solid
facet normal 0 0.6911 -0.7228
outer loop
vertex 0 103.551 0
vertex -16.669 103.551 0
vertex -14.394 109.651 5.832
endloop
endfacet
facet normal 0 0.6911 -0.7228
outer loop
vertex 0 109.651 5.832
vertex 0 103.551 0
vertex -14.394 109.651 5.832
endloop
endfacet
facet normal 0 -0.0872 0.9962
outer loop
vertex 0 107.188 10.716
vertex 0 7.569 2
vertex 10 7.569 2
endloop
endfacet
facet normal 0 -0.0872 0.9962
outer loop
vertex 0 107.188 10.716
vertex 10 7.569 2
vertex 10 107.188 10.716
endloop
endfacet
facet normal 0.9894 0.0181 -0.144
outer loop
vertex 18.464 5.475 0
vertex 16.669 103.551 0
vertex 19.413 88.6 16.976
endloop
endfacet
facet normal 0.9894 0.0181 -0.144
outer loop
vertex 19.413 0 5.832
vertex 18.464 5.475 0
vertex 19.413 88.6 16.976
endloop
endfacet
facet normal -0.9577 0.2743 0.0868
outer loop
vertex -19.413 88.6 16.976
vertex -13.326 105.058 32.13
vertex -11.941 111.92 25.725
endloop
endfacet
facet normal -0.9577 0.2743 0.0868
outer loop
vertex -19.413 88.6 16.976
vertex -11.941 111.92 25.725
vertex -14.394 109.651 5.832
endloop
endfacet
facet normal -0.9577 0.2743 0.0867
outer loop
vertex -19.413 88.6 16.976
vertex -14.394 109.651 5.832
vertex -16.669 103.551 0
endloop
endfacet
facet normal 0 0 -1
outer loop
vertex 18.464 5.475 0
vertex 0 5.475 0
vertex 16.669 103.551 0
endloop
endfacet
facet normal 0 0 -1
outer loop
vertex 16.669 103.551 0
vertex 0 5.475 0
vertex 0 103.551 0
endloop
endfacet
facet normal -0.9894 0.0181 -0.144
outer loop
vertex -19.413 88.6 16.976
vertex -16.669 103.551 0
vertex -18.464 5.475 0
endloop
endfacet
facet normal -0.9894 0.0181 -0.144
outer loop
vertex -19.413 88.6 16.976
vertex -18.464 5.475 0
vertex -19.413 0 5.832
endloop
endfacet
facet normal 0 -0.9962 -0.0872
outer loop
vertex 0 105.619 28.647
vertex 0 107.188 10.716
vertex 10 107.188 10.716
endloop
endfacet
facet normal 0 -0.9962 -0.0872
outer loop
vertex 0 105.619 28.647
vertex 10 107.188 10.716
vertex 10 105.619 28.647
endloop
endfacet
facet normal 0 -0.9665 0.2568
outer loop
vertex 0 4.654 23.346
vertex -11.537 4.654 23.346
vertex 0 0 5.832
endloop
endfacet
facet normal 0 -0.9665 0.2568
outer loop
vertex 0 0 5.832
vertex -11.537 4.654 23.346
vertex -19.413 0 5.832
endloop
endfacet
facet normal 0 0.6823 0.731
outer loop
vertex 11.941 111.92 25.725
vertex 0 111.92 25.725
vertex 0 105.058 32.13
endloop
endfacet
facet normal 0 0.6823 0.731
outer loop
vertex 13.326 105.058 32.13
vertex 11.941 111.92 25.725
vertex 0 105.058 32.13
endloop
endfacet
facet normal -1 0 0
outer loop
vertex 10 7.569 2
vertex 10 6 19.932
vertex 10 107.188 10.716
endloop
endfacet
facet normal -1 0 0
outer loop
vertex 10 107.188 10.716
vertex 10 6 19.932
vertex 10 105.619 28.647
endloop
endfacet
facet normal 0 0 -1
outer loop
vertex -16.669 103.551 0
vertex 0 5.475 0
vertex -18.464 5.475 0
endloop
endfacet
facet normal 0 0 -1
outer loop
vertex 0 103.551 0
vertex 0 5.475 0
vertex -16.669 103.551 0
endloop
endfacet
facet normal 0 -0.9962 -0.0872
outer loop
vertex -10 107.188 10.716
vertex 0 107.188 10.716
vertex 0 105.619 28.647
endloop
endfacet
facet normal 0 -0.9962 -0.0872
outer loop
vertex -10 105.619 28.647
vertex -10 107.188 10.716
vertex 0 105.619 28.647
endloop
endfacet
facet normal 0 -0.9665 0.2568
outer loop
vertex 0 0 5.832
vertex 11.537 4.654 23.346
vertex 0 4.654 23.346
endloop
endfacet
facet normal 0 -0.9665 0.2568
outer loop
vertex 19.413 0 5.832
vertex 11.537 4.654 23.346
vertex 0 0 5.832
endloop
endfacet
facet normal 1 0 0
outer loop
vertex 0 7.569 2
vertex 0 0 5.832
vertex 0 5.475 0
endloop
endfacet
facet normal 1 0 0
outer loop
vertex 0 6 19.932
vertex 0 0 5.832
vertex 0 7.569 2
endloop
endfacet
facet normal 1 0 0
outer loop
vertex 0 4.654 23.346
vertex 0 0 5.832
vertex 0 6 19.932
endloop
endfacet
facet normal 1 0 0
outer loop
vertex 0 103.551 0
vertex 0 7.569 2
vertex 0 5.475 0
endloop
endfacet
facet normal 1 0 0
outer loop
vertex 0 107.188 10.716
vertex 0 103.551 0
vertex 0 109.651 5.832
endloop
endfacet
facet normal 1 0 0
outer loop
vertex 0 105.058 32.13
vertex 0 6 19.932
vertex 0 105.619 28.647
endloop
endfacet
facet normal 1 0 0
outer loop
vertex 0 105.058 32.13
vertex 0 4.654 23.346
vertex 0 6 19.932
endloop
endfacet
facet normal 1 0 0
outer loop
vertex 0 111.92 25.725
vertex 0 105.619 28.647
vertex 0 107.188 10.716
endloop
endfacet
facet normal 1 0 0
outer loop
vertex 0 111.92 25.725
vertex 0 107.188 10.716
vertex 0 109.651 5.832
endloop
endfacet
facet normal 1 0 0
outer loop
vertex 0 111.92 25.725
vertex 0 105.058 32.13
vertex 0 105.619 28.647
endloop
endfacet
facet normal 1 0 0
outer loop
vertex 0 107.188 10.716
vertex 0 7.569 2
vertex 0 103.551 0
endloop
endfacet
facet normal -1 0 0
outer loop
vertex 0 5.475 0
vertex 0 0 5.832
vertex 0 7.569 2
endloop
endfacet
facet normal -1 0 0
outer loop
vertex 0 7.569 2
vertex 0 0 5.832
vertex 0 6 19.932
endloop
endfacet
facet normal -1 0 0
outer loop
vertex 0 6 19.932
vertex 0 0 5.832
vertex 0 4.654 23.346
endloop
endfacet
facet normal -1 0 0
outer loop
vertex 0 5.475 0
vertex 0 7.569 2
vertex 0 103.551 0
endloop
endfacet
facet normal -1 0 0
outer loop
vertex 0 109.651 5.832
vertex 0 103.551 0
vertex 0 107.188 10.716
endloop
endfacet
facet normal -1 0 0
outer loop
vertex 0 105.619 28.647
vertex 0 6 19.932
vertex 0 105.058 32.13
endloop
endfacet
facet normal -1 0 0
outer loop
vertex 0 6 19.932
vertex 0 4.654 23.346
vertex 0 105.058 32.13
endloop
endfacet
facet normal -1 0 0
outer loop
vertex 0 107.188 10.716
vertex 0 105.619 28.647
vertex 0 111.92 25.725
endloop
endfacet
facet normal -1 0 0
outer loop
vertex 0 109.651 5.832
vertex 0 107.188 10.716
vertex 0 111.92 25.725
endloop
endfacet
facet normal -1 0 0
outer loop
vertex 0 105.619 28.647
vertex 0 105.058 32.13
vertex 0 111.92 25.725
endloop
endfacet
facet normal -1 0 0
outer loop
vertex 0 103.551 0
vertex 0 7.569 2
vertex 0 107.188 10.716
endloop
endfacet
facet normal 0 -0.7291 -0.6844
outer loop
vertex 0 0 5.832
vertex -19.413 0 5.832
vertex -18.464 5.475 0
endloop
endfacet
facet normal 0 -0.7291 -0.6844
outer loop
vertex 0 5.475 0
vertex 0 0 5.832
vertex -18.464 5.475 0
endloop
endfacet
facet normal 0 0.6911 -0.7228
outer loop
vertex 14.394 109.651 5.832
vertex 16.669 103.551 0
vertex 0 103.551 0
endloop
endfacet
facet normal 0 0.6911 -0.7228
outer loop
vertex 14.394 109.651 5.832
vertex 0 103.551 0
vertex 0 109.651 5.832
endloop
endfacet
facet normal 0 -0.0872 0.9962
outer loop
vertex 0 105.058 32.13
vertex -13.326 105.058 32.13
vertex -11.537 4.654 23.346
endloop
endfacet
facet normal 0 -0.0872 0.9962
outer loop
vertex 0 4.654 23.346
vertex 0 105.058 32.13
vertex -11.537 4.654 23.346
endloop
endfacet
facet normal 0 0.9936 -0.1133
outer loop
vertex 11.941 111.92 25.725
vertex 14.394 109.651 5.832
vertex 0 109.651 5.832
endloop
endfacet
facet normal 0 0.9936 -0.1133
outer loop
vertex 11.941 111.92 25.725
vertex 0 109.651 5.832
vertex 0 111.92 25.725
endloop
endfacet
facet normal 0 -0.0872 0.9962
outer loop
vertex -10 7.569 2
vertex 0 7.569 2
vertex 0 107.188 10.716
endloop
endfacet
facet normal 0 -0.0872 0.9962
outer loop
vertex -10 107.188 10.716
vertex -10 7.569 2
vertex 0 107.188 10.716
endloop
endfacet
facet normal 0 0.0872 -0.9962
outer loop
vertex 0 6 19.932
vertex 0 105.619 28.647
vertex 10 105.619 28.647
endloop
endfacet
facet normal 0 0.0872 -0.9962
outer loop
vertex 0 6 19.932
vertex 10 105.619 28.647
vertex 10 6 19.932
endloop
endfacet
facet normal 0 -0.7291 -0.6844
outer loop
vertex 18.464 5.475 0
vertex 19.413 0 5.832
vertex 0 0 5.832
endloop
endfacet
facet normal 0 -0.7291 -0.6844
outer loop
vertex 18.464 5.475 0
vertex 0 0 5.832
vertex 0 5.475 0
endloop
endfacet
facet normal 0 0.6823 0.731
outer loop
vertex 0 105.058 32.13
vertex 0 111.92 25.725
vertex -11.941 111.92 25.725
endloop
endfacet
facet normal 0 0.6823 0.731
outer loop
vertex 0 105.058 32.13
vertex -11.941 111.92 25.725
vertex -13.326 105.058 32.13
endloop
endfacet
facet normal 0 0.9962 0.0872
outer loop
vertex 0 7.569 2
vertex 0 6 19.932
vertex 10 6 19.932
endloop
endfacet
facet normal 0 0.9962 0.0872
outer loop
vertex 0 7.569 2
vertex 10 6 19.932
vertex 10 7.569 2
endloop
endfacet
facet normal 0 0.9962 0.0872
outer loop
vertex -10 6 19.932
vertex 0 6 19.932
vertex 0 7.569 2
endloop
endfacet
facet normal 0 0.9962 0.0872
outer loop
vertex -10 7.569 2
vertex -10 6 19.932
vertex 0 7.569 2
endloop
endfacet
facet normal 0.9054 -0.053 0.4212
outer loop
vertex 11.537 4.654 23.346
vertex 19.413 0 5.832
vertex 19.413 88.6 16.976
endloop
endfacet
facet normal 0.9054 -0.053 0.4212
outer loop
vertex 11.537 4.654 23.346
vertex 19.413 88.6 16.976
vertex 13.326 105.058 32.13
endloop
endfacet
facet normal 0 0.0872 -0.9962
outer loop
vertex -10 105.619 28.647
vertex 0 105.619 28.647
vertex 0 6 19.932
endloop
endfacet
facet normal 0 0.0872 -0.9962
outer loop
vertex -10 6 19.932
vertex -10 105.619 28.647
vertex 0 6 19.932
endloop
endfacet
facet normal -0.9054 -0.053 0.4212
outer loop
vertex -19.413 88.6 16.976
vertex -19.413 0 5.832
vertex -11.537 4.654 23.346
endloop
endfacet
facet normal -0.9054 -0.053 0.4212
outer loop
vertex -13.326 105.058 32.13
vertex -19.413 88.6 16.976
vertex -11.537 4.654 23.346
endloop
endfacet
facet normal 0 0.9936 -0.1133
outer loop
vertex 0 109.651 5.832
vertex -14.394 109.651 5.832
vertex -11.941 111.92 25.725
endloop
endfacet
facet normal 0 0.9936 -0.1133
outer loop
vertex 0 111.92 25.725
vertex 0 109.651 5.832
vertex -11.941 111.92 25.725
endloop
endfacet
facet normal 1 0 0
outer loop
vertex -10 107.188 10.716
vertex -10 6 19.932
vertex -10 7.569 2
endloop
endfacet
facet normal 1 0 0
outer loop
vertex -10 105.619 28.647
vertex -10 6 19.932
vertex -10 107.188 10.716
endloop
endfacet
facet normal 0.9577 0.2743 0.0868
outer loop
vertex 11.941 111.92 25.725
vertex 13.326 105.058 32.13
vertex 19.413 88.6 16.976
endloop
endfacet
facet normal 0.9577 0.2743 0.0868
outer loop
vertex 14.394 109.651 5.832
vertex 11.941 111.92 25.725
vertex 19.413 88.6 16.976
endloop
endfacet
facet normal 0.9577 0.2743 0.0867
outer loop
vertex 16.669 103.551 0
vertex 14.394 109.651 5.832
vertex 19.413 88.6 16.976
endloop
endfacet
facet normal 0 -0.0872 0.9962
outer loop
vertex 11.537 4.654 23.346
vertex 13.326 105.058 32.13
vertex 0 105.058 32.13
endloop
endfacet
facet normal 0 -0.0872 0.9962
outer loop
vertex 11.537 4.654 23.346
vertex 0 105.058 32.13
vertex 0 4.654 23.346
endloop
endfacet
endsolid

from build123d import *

# Parameters (mm, degrees)
F0_W      = 115
F0_H      = 33
F1_DEPTH  = 25
F3_DEPTH  = 10
F5_DEPTH  = 25
F7_DEPTH  = 25
F9_DEPTH  = 25
F17_W     = 32.7993407845
F17_H     = 37.9629414529
F18_DEPTH = 25


with BuildPart() as f1:
    # F0 (on Right) → F1 (new body)
    with BuildSketch(Plane.YZ):
        with Locations((57.5, 16.5)):
            Rectangle(F0_W, F0_H)
    extrude(amount=-F1_DEPTH)

    # F2 (on face) → F3 (cut)
    with BuildSketch(Plane.YZ):
        Polygon((105.6194698092, 28.6470788404), (6, 19.9315045657), (7.5688033695, 2), (107.1882731786, 10.7155742748), align=None)
    extrude(amount=-F3_DEPTH, mode=Mode.SUBTRACT)

    # F4 (on face) → F5 (cut)
    with BuildSketch(Plane(origin=(-25, 0, 0), x_dir=(0, -1, 0), z_dir=(-1, 0, 0))):
        Polygon((0, 5.8324378915), (-5.4749199189, 0), (-7.2199194692, -11.1495498568), (5.3801964968, -11.1495498568), (5.3801964968, 35.8169563115), (-7.2199194692, 35.8169563115), (-7.2199194692, 33), align=None)
    extrude(amount=-F5_DEPTH, mode=Mode.SUBTRACT)

    # F6 (on face) → F7 (cut)
    with BuildSketch(Plane(origin=(-25, 0, 0), x_dir=(0, -1, 0), z_dir=(-1, 0, 0))):
        Polygon((-115, 33), (-4.6543203298, 23.3460039598), (-3.6770530503, 36.1189024326), (-115, 36.1189024326), align=None)
    extrude(amount=-F7_DEPTH, mode=Mode.SUBTRACT)

    # F8 (on face) → F9 (cut)
    with BuildSketch(Plane(origin=(-25, 0, 0), x_dir=(0, -1, 0), z_dir=(-1, 0, 0))):
        Polygon((-111.9198650122, 25.725428015), (-105.0578312922, 32.1301729472), (-121.2387805595, 36.2967017316), (-121.2387805595, -0.4341204442), (-103.5513704433, -4.0110512893), (-103.5513704433, 0), (-109.6513643861, 5.8324378915), align=None)
    extrude(amount=-F9_DEPTH, mode=Mode.SUBTRACT)

    # F12: sweep along a path in F11
    with BuildLine(Plane(origin=(-25, 0, 0), x_dir=(0, -1, 0), z_dir=(-1, 0, 0))) as f12_path:
        Line((0, 5.8324378915), (-123.256213963, 21.3349461555))
    # F10 (on Front) → F12 (sweep, cut)
    with BuildSketch(Plane.XZ):
        Polygon((-17.2159634531, -18.8802424818), (-16.2341240793, -16.0149671137), (-19.4127131253, 5.8324378915), (-8.9921113104, 28.2314289361), (-7.7811595984, 35.4352965951), (-12.1506929291, 37.1447764337), (-31.8302792653, 37.1447764337), (-30.6645408273, -5.6960321963), (-33.5724785489, -19.3253185429), align=None)
    sweep(path=f12_path.line, mode=Mode.SUBTRACT)

    # F17 (on 3pt) → F18 (cut)
    with BuildSketch(Plane(origin=(-42.4920744612, 12.1698290776, 3.8513417249), x_dir=(-0.2731735514, -0.961646076, 0.0247595513), z_dir=(-0.95772028, 0.2742933184, 0.0868046129))):
        with Locations((-91.7606838048, 14.5058231428)):
            Rectangle(F17_W, F17_H)
    extrude(amount=F18_DEPTH, mode=Mode.SUBTRACT)


with BuildPart() as f19_1:
    # F19: instance of F1
    add(f1.part.mirror(Plane.YZ))


solid = Compound([f1.part, f19_1.part])
